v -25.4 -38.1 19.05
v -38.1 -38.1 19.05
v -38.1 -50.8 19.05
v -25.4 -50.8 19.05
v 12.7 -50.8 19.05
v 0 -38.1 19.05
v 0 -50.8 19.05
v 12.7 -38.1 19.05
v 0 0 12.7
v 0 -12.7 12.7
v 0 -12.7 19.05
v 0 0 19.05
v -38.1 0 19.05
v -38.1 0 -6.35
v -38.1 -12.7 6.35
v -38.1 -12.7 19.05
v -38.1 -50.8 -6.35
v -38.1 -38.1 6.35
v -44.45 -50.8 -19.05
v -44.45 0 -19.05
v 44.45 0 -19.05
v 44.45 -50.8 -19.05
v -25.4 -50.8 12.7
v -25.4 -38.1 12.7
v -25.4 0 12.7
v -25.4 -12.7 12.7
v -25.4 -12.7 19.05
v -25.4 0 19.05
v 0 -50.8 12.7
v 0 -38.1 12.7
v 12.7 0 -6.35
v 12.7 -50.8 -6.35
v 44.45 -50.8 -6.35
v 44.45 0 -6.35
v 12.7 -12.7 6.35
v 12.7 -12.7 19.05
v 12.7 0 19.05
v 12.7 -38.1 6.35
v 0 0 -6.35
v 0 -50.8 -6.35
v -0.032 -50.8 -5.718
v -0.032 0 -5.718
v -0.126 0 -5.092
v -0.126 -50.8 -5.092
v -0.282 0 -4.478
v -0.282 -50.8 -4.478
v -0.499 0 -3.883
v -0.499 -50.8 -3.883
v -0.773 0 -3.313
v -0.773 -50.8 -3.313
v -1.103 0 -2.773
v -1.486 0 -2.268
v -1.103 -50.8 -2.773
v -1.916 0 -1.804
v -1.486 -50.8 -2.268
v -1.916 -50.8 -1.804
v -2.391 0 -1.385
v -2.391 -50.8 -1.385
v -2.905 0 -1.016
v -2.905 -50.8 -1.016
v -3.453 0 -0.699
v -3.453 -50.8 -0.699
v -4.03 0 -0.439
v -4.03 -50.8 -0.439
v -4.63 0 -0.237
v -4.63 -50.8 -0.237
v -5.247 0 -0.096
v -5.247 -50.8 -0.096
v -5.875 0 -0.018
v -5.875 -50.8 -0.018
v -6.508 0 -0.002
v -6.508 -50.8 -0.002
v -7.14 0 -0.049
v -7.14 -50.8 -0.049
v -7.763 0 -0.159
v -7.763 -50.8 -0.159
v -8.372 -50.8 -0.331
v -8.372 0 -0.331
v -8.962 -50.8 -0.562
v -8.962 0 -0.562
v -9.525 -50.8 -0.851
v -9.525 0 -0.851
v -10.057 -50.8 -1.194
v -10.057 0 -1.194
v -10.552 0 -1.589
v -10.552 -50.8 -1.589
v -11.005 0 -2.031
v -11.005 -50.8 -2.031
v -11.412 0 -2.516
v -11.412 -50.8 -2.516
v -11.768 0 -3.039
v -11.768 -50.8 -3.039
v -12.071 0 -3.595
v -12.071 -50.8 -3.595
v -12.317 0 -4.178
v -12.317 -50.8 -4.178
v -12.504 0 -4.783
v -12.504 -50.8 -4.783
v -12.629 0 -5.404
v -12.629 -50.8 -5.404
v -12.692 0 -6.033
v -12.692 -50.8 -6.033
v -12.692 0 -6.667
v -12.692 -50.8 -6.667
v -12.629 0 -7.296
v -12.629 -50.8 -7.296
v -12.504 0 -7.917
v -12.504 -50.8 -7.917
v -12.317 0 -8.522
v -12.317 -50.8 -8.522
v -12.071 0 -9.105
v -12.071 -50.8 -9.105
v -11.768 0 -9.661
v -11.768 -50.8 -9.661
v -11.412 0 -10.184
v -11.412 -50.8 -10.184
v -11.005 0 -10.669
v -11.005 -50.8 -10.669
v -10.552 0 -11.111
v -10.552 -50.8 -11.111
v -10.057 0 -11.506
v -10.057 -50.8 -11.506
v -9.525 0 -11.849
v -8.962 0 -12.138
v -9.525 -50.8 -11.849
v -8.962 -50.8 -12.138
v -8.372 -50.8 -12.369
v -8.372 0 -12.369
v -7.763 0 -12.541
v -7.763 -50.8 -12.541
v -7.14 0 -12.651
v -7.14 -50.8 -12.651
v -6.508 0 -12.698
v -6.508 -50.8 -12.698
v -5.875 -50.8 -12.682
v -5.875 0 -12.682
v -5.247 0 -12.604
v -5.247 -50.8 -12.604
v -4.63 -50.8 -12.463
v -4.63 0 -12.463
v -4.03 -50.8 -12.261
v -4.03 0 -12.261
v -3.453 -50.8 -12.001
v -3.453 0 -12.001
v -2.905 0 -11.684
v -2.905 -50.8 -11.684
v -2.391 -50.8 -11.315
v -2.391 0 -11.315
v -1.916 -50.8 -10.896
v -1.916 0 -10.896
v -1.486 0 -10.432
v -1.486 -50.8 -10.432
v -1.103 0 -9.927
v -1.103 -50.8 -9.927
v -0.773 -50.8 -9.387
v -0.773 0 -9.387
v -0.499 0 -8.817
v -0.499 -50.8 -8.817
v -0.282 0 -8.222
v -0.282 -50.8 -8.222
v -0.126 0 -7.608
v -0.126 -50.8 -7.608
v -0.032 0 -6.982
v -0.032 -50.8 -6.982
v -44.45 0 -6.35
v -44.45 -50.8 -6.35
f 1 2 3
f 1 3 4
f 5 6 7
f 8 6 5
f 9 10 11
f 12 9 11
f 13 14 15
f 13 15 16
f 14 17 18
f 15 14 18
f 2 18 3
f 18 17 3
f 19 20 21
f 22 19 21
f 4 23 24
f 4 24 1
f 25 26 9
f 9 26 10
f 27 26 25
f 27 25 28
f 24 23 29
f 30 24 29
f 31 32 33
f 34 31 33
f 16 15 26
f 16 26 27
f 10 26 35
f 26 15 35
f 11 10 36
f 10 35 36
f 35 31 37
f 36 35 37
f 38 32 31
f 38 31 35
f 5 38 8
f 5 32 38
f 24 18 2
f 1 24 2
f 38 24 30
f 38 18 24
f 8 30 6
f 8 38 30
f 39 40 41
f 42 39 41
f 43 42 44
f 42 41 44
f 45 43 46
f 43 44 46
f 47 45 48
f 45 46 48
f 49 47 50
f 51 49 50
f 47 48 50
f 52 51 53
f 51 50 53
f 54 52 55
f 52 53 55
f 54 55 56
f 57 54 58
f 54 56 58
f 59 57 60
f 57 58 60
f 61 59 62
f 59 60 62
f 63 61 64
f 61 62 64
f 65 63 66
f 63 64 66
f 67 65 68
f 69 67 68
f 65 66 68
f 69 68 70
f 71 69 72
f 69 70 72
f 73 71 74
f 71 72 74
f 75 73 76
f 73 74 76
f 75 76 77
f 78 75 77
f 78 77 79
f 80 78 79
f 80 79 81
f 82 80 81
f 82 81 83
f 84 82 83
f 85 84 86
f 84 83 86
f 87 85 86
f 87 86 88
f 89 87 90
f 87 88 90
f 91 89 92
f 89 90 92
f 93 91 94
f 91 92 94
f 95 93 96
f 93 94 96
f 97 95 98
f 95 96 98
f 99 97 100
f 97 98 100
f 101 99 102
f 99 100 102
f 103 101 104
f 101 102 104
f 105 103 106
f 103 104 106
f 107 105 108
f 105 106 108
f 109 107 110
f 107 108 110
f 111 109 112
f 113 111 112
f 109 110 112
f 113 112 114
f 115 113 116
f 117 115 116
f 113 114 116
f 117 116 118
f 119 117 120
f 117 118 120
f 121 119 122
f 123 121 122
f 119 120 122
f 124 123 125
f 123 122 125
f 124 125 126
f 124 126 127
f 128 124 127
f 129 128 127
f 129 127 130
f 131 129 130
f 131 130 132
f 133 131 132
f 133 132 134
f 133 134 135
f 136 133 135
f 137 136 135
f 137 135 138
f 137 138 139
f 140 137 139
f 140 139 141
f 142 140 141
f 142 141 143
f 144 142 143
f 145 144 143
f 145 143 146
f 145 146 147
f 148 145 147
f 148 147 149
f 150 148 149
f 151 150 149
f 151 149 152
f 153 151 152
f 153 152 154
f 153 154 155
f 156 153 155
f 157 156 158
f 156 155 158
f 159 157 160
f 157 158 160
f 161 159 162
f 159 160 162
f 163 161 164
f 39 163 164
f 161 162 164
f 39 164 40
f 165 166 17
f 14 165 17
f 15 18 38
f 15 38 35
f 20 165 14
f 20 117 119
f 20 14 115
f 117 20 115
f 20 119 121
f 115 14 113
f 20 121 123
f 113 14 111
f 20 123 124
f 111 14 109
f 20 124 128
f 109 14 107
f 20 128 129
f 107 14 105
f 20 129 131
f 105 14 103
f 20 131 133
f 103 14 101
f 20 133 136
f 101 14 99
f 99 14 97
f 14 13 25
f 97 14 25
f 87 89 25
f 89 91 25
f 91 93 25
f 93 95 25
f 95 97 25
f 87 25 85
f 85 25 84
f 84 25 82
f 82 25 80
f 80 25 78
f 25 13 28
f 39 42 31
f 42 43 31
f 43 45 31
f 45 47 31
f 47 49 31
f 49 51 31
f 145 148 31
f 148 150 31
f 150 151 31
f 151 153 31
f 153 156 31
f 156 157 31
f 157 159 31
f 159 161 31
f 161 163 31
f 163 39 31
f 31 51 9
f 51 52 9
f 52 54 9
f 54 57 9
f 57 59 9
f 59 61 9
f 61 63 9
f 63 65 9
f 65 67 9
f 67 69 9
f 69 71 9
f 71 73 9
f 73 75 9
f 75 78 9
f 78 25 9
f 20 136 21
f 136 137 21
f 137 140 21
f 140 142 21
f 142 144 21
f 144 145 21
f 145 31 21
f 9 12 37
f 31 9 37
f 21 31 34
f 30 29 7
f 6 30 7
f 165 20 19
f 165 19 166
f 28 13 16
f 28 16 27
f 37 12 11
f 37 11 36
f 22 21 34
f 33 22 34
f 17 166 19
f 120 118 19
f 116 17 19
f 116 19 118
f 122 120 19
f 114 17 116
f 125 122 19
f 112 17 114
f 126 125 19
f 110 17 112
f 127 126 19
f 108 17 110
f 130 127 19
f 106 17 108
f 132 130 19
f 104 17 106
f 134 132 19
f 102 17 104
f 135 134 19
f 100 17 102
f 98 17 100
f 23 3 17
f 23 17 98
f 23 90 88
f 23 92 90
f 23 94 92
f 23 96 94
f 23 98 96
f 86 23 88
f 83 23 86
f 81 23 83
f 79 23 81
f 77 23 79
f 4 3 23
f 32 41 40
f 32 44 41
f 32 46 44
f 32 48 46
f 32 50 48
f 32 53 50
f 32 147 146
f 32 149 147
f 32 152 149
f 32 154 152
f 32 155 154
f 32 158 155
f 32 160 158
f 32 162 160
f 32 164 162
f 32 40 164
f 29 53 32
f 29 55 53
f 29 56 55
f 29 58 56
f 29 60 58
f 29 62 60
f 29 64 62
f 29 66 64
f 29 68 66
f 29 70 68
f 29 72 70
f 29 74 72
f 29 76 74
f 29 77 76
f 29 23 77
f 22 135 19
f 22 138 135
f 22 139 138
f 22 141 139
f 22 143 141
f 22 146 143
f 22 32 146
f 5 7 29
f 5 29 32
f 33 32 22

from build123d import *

# Parameters (mm, degrees)
F0_W      = 88.9
F0_H      = 38.1
F1_DEPTH  = 50.8
F2_W      = 31.75
F2_H      = 25.4
F3_DEPTH  = 50.8
F4_W      = 25.4
F4_H      = 6.35
F5_DEPTH  = 50.8
F6_W      = 6.35
F6_H      = 25.4
F7_DEPTH  = 50.8
F8_W      = 25.4
F8_H      = 12.7
F9_DEPTH  = 50.8
F10_R     = 6.35
F11_DEPTH = 50.8


with BuildPart() as f1:
    # F0 (on Front) → F1 (new body)
    with BuildSketch(Plane.XZ):
        Rectangle(F0_W, F0_H)
    extrude(amount=F1_DEPTH)

    # F2 (on face) → F3 (cut)
    with BuildSketch(Plane.XZ.offset(50.8)):
        with Locations((28.575, 6.35)):
            Rectangle(F2_W, F2_H)
    extrude(amount=-F3_DEPTH, mode=Mode.SUBTRACT)

    # F4 (on face) → F5 (cut)
    with BuildSketch(Plane.XZ.offset(50.8)):
        with Locations((-12.7, 15.875)):
            Rectangle(F4_W, F4_H)
    extrude(amount=-F5_DEPTH, mode=Mode.SUBTRACT)

    # F6 (on face) → F7 (cut)
    with BuildSketch(Plane.XZ.offset(50.8)):
        with Locations((-41.275, 6.35)):
            Rectangle(F6_W, F6_H)
    extrude(amount=-F7_DEPTH, mode=Mode.SUBTRACT)

    # F8 (on face) → F9 (cut)
    with BuildSketch(Plane.YZ.offset(12.7)):
        with Locations((-25.4, 12.7)):
            Rectangle(F8_W, F8_H)
    extrude(amount=-F9_DEPTH, mode=Mode.SUBTRACT)

    # F10 (on face) → F11 (cut)
    with BuildSketch(Plane.XZ.offset(50.8)):
        with Locations((-6.35, -6.35)):
            Circle(F10_R)
    extrude(amount=-F11_DEPTH, mode=Mode.SUBTRACT)


solid = f1.part
